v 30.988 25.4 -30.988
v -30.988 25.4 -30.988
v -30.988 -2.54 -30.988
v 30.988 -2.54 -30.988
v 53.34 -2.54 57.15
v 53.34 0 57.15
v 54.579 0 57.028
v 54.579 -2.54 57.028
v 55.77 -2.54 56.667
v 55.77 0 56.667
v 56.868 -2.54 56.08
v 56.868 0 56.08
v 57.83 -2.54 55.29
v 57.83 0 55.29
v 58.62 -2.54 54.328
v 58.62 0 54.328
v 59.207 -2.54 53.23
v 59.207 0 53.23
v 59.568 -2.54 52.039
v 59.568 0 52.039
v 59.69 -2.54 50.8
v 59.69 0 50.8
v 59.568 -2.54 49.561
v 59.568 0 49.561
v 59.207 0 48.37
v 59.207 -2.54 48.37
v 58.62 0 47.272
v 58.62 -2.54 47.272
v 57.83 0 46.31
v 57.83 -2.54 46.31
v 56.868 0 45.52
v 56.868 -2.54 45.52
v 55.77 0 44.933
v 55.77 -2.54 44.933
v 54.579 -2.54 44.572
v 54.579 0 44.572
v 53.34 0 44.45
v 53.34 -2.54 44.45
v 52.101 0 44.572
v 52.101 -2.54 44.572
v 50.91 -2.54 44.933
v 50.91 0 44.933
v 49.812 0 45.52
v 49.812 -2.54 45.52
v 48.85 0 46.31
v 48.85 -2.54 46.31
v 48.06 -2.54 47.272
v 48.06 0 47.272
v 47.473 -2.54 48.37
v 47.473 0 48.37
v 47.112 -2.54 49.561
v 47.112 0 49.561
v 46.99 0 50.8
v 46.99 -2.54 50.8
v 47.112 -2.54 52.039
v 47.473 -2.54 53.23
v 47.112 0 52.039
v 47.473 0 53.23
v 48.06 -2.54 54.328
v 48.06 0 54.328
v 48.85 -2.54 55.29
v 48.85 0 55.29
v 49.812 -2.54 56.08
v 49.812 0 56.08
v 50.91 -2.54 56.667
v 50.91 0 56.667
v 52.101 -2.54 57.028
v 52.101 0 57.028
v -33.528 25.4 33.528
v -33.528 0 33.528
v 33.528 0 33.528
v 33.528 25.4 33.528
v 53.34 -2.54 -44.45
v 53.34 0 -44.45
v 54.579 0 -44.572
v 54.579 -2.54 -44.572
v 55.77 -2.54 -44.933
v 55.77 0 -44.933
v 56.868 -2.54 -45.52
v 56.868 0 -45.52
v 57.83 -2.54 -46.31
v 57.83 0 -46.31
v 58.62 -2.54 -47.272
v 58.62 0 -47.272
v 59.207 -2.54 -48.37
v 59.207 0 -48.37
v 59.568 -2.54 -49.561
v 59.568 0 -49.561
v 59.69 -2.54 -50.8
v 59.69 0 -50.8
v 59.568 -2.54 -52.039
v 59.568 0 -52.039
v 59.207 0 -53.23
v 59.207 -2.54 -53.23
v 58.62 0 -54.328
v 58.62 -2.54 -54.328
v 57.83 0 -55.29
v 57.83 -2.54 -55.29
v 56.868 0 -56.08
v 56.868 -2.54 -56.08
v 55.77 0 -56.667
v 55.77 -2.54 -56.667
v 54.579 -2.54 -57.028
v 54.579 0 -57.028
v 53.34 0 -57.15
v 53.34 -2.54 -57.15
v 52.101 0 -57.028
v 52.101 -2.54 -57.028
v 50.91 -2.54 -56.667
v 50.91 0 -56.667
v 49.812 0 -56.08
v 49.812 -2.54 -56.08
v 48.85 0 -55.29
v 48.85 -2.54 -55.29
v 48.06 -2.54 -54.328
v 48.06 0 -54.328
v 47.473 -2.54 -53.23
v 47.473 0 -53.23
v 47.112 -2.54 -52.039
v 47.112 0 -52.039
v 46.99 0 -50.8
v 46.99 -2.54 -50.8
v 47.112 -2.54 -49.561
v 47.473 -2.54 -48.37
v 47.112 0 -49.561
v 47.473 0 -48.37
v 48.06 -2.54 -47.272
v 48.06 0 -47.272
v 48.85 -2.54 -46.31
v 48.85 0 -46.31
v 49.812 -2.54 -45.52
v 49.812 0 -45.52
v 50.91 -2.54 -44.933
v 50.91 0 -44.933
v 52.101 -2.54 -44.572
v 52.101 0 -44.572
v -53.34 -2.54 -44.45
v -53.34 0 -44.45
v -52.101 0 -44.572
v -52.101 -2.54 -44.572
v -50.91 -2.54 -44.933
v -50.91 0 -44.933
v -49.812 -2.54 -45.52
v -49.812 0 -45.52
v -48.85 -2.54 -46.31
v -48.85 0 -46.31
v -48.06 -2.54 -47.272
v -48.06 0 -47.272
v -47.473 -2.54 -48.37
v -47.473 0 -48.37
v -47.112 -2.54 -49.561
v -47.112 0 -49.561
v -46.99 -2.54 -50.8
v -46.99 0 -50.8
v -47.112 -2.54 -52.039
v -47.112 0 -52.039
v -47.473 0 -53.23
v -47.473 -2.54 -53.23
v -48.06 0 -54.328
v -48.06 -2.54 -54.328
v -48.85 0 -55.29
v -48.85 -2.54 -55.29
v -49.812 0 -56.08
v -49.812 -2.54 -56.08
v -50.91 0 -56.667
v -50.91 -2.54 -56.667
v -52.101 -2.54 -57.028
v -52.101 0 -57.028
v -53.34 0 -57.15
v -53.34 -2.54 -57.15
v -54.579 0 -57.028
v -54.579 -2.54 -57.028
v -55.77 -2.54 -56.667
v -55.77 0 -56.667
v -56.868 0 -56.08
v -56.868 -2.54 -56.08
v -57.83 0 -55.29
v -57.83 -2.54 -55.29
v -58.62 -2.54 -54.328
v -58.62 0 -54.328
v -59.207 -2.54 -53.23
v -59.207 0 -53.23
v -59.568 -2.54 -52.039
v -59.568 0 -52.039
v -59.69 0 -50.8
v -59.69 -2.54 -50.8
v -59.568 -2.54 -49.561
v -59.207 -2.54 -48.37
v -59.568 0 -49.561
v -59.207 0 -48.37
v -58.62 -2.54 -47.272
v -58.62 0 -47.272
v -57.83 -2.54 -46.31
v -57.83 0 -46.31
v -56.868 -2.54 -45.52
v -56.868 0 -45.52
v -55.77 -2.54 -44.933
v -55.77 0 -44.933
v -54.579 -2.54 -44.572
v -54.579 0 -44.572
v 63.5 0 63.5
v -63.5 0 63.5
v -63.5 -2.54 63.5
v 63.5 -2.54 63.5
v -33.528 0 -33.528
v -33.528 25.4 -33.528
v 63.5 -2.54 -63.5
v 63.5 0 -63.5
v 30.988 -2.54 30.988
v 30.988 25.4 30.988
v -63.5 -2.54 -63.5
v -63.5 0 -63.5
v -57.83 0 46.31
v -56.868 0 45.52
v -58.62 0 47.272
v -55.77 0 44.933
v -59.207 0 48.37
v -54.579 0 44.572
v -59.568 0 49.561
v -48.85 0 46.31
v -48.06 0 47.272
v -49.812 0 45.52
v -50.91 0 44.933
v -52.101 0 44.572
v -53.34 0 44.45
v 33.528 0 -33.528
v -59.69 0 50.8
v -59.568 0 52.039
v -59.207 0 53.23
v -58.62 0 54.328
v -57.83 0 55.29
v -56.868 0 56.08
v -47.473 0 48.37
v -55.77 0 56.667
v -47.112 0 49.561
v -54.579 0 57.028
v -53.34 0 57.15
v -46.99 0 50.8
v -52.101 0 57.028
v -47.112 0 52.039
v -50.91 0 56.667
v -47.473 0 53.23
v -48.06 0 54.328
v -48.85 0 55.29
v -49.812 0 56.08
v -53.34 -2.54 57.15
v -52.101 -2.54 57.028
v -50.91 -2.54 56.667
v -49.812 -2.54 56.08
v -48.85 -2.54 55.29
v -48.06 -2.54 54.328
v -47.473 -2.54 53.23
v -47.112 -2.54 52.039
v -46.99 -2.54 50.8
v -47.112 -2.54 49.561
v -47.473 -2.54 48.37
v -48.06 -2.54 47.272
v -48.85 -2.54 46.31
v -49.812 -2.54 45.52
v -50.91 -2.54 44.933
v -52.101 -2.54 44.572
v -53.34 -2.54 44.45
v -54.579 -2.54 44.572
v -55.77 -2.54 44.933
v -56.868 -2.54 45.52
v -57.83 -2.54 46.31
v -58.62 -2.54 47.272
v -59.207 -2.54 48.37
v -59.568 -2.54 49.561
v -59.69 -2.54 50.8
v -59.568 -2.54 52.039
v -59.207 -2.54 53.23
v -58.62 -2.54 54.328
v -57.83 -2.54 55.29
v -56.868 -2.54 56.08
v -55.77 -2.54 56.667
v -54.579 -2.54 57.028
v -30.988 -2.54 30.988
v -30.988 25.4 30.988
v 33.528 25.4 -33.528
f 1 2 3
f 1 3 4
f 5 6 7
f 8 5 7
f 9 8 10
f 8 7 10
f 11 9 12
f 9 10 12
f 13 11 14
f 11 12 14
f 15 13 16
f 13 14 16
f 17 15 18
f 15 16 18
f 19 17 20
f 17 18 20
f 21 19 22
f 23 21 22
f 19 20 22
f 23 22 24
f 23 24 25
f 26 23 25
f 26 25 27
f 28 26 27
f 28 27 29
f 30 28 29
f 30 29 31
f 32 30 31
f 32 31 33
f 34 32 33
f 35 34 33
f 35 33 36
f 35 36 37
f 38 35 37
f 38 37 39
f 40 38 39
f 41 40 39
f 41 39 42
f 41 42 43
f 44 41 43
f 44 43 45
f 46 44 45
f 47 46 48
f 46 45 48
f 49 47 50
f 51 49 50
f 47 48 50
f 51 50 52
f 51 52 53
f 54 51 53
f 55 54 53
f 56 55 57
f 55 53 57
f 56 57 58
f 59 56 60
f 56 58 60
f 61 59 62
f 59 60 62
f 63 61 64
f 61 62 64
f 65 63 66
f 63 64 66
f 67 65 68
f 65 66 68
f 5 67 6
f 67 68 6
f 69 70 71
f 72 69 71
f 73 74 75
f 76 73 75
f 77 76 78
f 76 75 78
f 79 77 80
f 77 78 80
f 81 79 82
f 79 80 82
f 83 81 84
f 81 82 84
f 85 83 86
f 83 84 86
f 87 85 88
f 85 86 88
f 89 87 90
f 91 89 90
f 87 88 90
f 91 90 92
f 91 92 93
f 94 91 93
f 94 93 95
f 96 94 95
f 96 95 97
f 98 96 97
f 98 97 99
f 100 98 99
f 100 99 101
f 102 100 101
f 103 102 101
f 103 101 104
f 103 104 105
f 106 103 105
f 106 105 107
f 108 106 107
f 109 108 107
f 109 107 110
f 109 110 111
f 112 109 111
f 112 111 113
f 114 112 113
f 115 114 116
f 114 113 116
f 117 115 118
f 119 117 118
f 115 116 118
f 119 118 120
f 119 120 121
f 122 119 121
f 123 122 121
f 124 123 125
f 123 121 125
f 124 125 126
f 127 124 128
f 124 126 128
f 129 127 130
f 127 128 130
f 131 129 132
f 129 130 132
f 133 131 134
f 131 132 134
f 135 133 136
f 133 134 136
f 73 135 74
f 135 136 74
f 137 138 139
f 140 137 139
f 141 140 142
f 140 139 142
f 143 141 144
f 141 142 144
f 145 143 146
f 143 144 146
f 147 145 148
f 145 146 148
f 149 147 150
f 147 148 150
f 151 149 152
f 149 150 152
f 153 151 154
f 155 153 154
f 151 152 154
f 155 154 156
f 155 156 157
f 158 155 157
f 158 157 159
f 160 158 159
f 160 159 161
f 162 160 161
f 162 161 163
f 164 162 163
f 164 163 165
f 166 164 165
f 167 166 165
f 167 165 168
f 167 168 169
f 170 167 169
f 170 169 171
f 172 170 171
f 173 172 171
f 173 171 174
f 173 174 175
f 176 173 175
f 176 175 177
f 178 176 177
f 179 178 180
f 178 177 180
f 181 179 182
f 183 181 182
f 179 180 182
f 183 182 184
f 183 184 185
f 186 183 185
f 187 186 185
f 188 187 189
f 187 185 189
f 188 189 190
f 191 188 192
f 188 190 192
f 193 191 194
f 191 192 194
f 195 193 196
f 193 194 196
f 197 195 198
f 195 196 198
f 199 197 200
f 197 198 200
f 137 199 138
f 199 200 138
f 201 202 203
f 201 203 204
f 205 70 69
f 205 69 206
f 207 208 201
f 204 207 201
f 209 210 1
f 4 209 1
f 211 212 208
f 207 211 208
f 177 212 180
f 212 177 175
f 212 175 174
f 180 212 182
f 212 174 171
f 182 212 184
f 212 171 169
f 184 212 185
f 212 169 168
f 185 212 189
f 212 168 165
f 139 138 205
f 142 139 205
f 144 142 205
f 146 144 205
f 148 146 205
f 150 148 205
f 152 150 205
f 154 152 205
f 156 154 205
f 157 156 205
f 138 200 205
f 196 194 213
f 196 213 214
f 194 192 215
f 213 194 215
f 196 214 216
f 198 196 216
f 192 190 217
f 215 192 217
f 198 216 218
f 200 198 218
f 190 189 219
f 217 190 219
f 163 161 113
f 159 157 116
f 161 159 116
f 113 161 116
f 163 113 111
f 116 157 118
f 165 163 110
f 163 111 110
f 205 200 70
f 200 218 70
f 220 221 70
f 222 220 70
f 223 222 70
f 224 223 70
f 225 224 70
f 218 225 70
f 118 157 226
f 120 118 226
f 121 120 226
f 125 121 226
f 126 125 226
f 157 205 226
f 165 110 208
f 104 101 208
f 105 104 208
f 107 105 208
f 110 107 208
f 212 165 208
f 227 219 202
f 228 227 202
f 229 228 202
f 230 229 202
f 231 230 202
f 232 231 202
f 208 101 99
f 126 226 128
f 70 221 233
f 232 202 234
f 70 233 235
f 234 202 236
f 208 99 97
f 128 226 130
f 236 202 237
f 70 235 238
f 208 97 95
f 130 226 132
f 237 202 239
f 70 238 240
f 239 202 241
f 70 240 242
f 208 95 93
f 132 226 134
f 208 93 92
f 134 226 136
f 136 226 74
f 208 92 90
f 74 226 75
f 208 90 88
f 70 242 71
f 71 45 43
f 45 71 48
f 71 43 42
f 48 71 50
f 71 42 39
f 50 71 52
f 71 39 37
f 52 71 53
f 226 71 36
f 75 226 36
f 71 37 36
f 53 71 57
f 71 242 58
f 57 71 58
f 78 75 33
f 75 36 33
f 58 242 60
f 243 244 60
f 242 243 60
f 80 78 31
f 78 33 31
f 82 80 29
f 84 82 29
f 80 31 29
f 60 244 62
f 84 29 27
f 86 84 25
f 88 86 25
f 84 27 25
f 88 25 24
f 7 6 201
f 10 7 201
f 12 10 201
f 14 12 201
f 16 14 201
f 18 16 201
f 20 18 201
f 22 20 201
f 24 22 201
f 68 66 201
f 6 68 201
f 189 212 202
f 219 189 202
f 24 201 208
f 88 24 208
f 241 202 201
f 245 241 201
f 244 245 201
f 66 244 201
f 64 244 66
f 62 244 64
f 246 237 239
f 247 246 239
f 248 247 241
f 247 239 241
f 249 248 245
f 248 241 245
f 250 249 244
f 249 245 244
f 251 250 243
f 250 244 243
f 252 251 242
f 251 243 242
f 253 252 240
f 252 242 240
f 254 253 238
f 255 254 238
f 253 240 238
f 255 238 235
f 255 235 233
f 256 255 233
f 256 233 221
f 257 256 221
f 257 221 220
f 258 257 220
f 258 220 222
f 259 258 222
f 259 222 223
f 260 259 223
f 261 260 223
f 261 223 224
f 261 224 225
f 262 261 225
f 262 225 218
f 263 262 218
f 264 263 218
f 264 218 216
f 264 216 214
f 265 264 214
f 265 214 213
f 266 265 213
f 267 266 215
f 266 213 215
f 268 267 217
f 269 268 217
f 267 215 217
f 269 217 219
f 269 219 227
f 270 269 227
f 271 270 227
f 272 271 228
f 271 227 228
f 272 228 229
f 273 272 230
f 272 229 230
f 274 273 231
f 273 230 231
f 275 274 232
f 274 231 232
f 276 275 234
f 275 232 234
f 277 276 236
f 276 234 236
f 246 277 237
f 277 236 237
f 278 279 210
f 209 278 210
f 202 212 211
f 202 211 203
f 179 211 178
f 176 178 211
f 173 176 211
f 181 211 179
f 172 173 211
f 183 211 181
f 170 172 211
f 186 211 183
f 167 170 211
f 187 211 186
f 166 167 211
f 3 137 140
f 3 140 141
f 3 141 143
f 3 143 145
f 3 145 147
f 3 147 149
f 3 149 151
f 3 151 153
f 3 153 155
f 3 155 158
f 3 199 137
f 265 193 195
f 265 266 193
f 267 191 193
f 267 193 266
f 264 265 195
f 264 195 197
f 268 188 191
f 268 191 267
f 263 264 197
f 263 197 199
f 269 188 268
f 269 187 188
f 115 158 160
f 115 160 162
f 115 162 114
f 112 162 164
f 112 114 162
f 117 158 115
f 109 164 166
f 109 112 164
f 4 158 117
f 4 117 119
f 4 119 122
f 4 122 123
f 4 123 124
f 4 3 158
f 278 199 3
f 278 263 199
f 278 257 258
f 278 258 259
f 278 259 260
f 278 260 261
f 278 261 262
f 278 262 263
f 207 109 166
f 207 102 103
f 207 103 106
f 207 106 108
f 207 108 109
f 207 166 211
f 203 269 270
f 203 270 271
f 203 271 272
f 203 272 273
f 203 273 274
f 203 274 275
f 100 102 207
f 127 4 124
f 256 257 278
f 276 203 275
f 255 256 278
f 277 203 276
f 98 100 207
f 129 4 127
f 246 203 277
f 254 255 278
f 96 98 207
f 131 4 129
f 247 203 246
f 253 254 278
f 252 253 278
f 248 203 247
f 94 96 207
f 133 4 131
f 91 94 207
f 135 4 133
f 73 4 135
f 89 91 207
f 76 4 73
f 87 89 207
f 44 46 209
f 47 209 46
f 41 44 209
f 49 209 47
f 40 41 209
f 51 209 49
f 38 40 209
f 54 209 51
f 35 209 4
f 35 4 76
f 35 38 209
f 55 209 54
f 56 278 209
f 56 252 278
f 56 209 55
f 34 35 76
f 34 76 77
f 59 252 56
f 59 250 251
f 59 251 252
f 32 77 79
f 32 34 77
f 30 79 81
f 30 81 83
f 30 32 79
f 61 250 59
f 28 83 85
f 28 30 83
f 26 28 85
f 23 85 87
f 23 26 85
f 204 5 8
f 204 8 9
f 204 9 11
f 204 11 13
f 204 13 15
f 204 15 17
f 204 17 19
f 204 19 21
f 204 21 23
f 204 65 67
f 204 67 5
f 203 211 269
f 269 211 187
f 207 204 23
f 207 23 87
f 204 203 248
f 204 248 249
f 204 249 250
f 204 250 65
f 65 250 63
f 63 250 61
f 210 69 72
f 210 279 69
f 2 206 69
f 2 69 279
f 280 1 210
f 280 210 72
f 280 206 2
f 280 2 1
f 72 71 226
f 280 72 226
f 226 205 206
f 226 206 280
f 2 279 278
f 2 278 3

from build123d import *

# Parameters (mm, degrees)
SKETCH1_W           = 67.056
SKETCH1_H           = 67.056
SKETCH1_W_2         = 61.976
SKETCH1_H_2         = 61.976
BOSS_EXTRUDE1_DEPTH = 25.4
SKETCH3_W           = 127
SKETCH3_H           = 127
BOSS_EXTRUDE2_DEPTH = 2.54
SKETCH4_R           = 6.35
CUT_EXTRUDE1_DEPTH  = 94.3255592
SKETCH6_W           = 61.976
SKETCH6_H           = 61.976
CUT_EXTRUDE2_DEPTH  = 94.3255592


with BuildPart() as part:
    # Sketch1 → Boss-Extrude1 (new body)
    with BuildSketch(Plane(origin=(0, 0, 0), x_dir=(1, 0, 0), z_dir=(0, 1, 0))):
        Rectangle(SKETCH1_W, SKETCH1_H)
        Rectangle(SKETCH1_W_2, SKETCH1_H_2, mode=Mode.SUBTRACT)
    extrude(amount=BOSS_EXTRUDE1_DEPTH)

    # Sketch3 → Boss-Extrude2 (add)
    with BuildSketch(Plane.XZ):
        Rectangle(SKETCH3_W, SKETCH3_H)
    extrude(amount=BOSS_EXTRUDE2_DEPTH)

    # Sketch4 → Cut-Extrude1 (cut, through all)
    with BuildSketch(Plane(origin=(0, 0, 0), x_dir=(1, 0, 0), z_dir=(0, 1, 0))):
        with Locations(Location((-53.34, 50.8, 0), (0, 0, 270))):
            Circle(SKETCH4_R)
        with Locations(Location((53.34, 50.8, 0), (0, 0, 270))):
            Circle(SKETCH4_R)
        with Locations(Location((53.34, -50.8, 0), (0, 0, 270))):
            Circle(SKETCH4_R)
        with Locations(Location((-53.34, -50.8, 0), (0, 0, 270))):
            Circle(SKETCH4_R)
    extrude(amount=-CUT_EXTRUDE1_DEPTH, mode=Mode.SUBTRACT)

    # Sketch6 → Cut-Extrude2 (cut, through all)
    with BuildSketch(Plane(origin=(0, 0, 0), x_dir=(1, 0, 0), z_dir=(0, 1, 0))):
        Rectangle(SKETCH6_W, SKETCH6_H)
    extrude(amount=-CUT_EXTRUDE2_DEPTH, mode=Mode.SUBTRACT)


solid = part.part
